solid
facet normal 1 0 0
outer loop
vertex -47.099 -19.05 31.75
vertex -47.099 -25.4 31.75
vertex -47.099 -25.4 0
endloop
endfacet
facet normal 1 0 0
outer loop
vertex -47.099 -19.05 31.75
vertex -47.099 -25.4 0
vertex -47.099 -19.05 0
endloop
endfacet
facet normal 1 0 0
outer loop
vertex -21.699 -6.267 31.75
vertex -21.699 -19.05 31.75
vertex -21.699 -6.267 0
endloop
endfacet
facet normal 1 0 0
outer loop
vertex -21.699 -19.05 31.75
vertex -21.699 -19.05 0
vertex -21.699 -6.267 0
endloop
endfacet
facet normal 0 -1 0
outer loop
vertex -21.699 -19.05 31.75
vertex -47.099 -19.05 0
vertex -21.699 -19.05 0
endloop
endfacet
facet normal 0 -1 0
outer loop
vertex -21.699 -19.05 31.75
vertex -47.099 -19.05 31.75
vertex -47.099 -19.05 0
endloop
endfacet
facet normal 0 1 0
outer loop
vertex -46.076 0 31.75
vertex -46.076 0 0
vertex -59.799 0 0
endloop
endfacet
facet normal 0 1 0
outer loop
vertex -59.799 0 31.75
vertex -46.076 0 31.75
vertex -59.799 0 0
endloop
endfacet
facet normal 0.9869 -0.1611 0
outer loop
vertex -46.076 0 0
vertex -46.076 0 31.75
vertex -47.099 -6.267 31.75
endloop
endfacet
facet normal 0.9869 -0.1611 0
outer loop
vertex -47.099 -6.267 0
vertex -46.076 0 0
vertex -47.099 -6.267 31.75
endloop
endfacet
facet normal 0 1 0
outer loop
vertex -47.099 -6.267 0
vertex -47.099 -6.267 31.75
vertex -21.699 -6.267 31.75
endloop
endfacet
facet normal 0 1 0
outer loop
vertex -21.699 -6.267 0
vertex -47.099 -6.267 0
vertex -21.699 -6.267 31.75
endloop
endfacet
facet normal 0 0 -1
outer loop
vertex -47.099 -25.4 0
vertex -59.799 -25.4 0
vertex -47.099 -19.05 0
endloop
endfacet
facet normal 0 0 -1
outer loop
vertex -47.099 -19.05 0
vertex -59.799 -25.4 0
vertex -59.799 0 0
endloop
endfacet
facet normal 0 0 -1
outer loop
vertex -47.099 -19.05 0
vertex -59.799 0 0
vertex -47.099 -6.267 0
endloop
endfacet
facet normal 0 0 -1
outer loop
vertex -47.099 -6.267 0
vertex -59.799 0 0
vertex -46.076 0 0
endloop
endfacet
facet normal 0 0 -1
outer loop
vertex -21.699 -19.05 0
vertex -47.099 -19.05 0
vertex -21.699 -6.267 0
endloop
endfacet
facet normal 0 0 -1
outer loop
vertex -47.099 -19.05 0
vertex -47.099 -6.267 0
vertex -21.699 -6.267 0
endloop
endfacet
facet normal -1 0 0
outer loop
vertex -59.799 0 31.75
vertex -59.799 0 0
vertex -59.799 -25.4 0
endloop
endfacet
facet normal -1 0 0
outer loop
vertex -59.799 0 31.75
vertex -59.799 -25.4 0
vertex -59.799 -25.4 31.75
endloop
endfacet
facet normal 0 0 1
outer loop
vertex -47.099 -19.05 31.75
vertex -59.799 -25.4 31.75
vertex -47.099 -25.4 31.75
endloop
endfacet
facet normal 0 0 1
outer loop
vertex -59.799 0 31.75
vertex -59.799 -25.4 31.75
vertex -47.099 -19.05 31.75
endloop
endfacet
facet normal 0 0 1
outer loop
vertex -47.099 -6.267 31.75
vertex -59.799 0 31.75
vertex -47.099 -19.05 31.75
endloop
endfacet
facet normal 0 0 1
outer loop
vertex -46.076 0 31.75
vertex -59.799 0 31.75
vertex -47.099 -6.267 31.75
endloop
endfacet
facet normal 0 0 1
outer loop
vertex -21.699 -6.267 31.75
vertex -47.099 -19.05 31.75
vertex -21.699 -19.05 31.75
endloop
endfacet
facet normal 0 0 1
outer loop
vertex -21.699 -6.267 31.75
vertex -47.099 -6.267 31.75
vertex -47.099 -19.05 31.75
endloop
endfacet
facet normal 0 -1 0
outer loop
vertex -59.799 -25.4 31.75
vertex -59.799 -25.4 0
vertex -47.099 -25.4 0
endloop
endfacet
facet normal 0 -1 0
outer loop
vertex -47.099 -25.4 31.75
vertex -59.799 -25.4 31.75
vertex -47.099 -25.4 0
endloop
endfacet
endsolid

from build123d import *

# Parameters (mm, degrees)
F0_W     = 38.1
F0_H     = 31.75
F1_DEPTH = 25.4
F2_W     = 25.4
F2_H     = 6.35
F3_DEPTH = 25.4
F4_DEPTH = 6.35
F6_DEPTH = 31.75
F7_DEPTH = 57.15
F8_DEPTH = 25.4


with BuildPart() as f1:
    # F0 (on Front) → F1 (new body)
    with BuildSketch(Plane.XZ):
        with Locations((-40.7485894724, 15.875)):
            Rectangle(F0_W, F0_H)
    extrude(amount=F1_DEPTH)

    # F2 (on face) → F3 (cut)
    with BuildSketch(Plane.XY.offset(31.75)):
        with Locations((-34.3985894724, -22.225)):
            Rectangle(F2_W, F2_H)
    extrude(amount=-F3_DEPTH, mode=Mode.SUBTRACT)

    # F4 (cut): a face of the model
    f4_faces = [f1.faces().sort_by_distance(p)[0] for p in [
        (-34.3985894724, -22.225, 6.35),
    ]]
    extrude(f4_faces, amount=-F4_DEPTH, mode=Mode.SUBTRACT)

    # F5 (on face) → F6 (join)
    with BuildSketch(Plane.XY.offset(31.75)):
        Polygon((-47.0985894724, -6.2670672635), (-21.6985894724, -6.2670672635), (-21.6985894724, 0), (-46.0756682071, 0), align=None)
    extrude(amount=F6_DEPTH)

    # F7 (cut): a face of the model
    f7_faces = [f1.faces().sort_by_distance(p)[0] for p in [
        (-34.1446109127, -3.1549983853, 63.5),
    ]]
    extrude(f7_faces, amount=-F7_DEPTH, mode=Mode.SUBTRACT)

    # F8 (cut): a face of the model
    f8_faces = [f1.faces().sort_by_distance(p)[0] for p in [
        (-34.1446109127, -3.1549983853, 6.35),
    ]]
    extrude(f8_faces, amount=-F8_DEPTH, mode=Mode.SUBTRACT)


solid = f1.part
